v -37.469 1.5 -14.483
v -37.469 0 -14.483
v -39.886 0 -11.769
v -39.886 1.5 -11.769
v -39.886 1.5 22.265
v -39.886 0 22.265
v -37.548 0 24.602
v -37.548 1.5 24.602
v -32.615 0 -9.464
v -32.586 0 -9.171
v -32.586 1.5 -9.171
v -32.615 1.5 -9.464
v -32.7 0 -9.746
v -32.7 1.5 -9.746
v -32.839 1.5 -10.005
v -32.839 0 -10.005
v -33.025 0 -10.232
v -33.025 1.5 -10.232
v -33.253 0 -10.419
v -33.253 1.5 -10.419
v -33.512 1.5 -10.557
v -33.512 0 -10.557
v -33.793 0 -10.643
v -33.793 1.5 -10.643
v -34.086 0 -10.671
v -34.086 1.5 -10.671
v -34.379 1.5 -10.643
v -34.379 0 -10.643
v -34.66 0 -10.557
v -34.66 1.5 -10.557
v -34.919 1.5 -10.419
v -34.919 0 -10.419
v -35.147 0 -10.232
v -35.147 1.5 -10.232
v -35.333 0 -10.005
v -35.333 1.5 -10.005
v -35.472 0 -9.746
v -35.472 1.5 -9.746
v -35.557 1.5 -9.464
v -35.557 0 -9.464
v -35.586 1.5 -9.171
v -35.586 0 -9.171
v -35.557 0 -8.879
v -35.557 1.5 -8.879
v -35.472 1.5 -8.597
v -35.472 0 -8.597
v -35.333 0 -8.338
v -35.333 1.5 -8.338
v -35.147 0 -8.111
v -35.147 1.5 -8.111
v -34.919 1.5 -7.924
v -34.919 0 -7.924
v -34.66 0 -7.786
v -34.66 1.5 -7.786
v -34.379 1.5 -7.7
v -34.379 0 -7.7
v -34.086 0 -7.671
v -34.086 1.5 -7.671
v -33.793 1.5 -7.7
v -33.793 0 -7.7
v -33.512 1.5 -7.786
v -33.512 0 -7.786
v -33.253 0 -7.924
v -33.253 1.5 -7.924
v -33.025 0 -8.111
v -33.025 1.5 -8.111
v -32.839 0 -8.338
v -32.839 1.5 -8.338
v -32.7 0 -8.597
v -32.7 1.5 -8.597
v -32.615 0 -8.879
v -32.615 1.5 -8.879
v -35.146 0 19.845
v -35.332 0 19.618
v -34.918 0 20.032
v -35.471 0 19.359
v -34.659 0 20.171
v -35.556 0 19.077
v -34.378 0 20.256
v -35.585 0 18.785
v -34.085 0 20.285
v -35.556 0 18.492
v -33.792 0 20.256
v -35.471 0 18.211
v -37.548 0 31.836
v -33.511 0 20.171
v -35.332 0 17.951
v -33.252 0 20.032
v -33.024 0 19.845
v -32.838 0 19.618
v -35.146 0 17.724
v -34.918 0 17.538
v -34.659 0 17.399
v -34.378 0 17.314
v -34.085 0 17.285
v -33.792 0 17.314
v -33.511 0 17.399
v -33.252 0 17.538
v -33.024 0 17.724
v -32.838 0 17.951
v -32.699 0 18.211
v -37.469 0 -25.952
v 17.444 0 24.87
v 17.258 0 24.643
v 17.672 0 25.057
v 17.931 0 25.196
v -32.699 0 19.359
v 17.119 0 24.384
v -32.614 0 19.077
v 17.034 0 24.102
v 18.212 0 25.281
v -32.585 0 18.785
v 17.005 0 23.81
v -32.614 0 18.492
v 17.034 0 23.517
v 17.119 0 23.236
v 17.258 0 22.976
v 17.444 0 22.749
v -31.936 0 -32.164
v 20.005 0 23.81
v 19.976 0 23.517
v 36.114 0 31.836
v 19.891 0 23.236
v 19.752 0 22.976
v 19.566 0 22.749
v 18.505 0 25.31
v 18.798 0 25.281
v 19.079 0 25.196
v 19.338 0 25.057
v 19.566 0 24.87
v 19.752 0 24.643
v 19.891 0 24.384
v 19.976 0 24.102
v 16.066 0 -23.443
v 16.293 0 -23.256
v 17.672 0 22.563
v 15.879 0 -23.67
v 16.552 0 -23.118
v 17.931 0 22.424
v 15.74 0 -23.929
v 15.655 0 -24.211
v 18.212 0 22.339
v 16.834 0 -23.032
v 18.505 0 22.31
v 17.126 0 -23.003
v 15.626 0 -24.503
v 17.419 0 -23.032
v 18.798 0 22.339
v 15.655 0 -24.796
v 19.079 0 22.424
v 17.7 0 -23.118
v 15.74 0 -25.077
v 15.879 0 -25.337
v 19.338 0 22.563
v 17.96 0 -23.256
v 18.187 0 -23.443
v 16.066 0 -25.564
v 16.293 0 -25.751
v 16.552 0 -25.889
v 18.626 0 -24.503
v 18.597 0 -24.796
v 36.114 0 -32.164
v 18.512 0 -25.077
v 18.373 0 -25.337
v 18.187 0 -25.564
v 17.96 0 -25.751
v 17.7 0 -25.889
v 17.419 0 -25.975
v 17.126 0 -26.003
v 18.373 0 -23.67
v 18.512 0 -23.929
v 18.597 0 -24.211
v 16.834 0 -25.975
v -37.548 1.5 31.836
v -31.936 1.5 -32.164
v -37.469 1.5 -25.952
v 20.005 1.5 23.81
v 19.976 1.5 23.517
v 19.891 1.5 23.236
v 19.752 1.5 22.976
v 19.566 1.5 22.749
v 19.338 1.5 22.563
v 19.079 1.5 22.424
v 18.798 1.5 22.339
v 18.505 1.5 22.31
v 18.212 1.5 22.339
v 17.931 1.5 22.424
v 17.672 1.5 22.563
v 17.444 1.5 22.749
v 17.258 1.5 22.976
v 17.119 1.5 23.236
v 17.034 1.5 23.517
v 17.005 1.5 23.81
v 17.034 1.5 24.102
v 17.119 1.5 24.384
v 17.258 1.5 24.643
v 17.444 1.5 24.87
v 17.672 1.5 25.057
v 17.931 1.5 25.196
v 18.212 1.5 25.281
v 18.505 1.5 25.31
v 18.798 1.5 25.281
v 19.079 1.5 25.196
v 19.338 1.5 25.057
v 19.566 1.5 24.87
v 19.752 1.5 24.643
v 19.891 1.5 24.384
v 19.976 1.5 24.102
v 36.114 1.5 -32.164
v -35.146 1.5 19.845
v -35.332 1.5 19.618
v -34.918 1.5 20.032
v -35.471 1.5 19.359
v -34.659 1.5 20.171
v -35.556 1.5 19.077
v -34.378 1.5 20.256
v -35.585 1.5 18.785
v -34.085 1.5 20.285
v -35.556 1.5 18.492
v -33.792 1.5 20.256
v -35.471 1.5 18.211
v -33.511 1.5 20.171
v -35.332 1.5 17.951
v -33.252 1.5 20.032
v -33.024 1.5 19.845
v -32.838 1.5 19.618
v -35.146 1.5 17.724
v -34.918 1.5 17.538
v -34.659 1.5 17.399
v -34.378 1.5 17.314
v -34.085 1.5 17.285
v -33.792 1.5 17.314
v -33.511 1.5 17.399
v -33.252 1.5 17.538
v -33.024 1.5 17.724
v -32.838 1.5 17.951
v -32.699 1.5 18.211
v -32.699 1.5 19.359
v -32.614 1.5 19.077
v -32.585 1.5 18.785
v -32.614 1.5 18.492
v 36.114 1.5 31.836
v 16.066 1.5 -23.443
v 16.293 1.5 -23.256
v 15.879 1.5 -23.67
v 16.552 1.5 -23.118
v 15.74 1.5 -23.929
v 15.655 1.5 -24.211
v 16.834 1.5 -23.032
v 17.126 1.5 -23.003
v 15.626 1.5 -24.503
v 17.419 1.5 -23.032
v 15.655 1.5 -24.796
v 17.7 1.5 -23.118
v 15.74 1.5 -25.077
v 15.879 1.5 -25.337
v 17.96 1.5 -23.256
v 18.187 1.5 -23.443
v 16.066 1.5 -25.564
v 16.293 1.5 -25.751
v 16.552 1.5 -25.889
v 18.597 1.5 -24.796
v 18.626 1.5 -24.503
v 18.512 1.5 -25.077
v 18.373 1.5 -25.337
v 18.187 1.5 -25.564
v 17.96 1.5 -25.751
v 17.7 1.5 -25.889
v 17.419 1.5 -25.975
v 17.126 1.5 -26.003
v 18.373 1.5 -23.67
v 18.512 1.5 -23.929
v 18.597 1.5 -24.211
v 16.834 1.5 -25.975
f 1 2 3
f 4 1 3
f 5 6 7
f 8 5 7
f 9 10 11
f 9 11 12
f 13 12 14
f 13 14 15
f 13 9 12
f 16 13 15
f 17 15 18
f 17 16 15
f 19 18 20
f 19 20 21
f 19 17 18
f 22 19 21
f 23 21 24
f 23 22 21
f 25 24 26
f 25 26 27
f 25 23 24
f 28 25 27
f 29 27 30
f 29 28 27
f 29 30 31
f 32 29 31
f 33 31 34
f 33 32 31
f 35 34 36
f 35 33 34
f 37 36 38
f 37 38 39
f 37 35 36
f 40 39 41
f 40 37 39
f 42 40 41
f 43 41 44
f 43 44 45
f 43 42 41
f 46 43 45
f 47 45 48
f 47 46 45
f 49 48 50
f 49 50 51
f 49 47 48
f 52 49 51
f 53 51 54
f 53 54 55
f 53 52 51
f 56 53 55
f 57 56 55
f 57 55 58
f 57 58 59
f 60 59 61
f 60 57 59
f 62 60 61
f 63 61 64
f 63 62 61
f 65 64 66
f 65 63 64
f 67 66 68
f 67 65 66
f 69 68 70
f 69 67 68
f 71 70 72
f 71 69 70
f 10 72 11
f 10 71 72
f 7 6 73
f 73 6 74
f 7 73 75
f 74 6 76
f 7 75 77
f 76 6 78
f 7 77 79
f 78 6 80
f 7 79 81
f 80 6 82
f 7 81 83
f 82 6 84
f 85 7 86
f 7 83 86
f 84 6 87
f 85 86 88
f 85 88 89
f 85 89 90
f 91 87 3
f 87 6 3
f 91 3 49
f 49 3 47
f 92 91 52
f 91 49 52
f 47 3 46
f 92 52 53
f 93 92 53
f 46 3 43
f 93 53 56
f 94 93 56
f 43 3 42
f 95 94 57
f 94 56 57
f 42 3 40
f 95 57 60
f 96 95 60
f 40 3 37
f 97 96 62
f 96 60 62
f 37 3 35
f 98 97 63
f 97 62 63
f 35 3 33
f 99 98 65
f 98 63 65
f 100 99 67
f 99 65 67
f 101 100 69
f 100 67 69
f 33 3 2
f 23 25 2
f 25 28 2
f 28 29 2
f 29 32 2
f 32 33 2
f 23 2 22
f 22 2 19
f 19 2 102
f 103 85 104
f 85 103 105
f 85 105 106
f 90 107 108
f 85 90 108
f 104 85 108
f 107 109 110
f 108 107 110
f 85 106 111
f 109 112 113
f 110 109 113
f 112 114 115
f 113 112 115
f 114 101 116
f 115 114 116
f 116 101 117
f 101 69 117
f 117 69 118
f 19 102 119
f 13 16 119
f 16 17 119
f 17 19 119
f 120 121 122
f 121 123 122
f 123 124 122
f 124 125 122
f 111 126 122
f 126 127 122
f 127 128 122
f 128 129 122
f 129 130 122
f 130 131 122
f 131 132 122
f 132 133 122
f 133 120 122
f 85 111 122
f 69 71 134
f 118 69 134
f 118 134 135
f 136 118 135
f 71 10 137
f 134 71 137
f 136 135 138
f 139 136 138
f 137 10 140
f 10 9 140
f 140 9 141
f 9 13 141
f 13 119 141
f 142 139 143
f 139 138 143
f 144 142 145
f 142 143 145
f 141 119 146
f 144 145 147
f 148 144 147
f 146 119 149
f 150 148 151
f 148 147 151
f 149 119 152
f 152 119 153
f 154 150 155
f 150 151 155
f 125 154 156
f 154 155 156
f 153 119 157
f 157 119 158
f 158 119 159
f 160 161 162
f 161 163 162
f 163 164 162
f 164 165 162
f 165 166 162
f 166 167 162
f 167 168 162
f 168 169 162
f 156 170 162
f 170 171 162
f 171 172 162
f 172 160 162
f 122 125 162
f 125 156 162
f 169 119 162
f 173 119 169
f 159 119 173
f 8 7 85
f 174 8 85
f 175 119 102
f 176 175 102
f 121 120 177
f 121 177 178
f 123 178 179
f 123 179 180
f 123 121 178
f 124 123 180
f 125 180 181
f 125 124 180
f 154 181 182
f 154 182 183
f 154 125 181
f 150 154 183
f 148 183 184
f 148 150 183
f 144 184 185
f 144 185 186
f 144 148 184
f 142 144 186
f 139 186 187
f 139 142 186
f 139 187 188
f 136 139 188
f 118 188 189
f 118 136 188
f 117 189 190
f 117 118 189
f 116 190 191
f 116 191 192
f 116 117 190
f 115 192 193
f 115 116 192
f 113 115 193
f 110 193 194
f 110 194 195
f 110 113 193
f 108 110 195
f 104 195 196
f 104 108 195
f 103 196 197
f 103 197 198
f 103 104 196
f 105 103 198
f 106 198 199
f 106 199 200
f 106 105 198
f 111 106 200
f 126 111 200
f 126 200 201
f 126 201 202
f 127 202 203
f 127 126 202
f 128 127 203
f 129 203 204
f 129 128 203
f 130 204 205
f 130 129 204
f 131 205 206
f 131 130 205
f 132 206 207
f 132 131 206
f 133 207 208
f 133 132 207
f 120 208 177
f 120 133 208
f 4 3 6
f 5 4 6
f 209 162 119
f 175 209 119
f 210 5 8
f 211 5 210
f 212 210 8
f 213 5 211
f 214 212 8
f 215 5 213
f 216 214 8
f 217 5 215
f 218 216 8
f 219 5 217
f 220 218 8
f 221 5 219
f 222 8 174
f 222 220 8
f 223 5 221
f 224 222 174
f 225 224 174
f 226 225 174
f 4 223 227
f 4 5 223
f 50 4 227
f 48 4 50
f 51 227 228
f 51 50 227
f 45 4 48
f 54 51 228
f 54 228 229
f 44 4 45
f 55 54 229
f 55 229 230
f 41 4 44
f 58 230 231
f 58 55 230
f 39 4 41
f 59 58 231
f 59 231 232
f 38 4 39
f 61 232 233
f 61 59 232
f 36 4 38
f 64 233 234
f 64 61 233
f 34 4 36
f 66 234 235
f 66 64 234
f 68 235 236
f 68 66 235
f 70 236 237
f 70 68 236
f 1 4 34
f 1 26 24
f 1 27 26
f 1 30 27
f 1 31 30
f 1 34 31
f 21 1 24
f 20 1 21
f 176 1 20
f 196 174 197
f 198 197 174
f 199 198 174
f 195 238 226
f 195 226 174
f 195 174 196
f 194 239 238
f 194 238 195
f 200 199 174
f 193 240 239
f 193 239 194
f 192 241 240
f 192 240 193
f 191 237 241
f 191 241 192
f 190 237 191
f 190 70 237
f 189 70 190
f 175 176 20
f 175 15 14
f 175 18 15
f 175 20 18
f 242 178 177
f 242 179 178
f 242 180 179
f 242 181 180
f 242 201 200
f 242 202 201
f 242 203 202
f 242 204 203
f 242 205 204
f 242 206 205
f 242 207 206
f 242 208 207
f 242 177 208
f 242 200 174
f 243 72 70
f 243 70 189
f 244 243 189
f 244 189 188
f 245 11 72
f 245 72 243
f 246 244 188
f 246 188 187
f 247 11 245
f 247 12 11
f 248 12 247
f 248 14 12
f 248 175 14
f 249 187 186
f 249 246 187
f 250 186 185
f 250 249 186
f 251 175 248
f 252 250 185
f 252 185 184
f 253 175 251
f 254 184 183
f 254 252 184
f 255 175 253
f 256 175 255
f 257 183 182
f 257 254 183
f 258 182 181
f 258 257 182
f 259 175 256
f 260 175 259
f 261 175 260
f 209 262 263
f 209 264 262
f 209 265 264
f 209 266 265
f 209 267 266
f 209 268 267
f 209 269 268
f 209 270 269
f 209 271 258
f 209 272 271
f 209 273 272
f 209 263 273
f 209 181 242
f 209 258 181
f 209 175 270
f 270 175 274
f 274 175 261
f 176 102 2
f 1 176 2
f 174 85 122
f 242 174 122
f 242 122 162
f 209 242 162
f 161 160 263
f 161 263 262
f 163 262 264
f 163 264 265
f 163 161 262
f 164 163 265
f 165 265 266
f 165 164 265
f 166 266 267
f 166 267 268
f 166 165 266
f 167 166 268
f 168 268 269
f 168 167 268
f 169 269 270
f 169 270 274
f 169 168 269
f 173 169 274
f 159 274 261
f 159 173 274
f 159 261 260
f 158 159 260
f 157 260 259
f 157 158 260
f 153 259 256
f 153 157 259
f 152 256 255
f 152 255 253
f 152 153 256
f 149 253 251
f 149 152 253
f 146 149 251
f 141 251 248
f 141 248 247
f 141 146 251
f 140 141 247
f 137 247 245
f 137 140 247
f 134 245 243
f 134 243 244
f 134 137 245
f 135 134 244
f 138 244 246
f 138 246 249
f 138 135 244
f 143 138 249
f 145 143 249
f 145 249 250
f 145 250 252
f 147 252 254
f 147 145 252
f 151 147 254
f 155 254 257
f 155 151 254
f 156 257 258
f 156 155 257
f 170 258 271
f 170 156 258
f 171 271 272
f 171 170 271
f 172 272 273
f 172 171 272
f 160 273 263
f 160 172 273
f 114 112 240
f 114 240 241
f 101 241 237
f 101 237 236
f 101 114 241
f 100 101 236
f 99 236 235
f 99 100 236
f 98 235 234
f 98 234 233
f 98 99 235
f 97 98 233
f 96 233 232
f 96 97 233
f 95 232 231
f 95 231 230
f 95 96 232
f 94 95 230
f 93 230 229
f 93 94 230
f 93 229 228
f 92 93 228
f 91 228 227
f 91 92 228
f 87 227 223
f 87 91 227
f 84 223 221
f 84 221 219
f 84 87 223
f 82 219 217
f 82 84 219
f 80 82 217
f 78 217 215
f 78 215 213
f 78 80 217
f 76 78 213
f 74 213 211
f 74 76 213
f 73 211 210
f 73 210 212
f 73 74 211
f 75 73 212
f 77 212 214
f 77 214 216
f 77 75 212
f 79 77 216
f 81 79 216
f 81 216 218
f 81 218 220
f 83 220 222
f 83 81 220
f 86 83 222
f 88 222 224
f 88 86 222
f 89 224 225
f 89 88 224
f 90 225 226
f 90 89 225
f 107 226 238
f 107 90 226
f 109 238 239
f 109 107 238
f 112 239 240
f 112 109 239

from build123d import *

# Parameters (mm, degrees)
BOSS_EXTRUDE3_DEPTH = 1.5
SKETCH3_R           = 1.5
CUT_EXTRUDE6_DEPTH  = 1.5


with BuildPart() as part:
    # Sketch5 → Boss-Extrude3 (new body)
    with BuildSketch(Plane(origin=(0, 0, 0), x_dir=(1, 0, 0), z_dir=(0, 1, 0))):
        Polygon((-31.936172748, 32.164122013), (-37.46862037, 25.951620882), (-37.46862037, 14.483050574), (-39.885792802, 11.768757102), (-39.885792802, -22.264531804), (-37.547976629, -24.602347977), (-37.547976629, -31.835877987), (-31.61237508, -31.835877987), (36.114207198, -31.835877987), (36.114207198, 32.164122013), align=None)
    extrude(amount=BOSS_EXTRUDE3_DEPTH)

    # Sketch3 → Cut-Extrude6 (cut)
    with BuildSketch(Plane(origin=(0, 0, 0), x_dir=(1, 0, 0), z_dir=(0, 1, 0))):
        with Locations((-34.085940204, 9.171489798)):
            Circle(SKETCH3_R)
        with Locations((-34.085040269, -18.784732287)):
            Circle(SKETCH3_R)
        with Locations((17.126200612, 24.50342873)):
            Circle(SKETCH3_R)
        with Locations((18.50498177, -23.809750535)):
            Circle(SKETCH3_R)
    extrude(amount=CUT_EXTRUDE6_DEPTH, mode=Mode.SUBTRACT)


solid = part.part
